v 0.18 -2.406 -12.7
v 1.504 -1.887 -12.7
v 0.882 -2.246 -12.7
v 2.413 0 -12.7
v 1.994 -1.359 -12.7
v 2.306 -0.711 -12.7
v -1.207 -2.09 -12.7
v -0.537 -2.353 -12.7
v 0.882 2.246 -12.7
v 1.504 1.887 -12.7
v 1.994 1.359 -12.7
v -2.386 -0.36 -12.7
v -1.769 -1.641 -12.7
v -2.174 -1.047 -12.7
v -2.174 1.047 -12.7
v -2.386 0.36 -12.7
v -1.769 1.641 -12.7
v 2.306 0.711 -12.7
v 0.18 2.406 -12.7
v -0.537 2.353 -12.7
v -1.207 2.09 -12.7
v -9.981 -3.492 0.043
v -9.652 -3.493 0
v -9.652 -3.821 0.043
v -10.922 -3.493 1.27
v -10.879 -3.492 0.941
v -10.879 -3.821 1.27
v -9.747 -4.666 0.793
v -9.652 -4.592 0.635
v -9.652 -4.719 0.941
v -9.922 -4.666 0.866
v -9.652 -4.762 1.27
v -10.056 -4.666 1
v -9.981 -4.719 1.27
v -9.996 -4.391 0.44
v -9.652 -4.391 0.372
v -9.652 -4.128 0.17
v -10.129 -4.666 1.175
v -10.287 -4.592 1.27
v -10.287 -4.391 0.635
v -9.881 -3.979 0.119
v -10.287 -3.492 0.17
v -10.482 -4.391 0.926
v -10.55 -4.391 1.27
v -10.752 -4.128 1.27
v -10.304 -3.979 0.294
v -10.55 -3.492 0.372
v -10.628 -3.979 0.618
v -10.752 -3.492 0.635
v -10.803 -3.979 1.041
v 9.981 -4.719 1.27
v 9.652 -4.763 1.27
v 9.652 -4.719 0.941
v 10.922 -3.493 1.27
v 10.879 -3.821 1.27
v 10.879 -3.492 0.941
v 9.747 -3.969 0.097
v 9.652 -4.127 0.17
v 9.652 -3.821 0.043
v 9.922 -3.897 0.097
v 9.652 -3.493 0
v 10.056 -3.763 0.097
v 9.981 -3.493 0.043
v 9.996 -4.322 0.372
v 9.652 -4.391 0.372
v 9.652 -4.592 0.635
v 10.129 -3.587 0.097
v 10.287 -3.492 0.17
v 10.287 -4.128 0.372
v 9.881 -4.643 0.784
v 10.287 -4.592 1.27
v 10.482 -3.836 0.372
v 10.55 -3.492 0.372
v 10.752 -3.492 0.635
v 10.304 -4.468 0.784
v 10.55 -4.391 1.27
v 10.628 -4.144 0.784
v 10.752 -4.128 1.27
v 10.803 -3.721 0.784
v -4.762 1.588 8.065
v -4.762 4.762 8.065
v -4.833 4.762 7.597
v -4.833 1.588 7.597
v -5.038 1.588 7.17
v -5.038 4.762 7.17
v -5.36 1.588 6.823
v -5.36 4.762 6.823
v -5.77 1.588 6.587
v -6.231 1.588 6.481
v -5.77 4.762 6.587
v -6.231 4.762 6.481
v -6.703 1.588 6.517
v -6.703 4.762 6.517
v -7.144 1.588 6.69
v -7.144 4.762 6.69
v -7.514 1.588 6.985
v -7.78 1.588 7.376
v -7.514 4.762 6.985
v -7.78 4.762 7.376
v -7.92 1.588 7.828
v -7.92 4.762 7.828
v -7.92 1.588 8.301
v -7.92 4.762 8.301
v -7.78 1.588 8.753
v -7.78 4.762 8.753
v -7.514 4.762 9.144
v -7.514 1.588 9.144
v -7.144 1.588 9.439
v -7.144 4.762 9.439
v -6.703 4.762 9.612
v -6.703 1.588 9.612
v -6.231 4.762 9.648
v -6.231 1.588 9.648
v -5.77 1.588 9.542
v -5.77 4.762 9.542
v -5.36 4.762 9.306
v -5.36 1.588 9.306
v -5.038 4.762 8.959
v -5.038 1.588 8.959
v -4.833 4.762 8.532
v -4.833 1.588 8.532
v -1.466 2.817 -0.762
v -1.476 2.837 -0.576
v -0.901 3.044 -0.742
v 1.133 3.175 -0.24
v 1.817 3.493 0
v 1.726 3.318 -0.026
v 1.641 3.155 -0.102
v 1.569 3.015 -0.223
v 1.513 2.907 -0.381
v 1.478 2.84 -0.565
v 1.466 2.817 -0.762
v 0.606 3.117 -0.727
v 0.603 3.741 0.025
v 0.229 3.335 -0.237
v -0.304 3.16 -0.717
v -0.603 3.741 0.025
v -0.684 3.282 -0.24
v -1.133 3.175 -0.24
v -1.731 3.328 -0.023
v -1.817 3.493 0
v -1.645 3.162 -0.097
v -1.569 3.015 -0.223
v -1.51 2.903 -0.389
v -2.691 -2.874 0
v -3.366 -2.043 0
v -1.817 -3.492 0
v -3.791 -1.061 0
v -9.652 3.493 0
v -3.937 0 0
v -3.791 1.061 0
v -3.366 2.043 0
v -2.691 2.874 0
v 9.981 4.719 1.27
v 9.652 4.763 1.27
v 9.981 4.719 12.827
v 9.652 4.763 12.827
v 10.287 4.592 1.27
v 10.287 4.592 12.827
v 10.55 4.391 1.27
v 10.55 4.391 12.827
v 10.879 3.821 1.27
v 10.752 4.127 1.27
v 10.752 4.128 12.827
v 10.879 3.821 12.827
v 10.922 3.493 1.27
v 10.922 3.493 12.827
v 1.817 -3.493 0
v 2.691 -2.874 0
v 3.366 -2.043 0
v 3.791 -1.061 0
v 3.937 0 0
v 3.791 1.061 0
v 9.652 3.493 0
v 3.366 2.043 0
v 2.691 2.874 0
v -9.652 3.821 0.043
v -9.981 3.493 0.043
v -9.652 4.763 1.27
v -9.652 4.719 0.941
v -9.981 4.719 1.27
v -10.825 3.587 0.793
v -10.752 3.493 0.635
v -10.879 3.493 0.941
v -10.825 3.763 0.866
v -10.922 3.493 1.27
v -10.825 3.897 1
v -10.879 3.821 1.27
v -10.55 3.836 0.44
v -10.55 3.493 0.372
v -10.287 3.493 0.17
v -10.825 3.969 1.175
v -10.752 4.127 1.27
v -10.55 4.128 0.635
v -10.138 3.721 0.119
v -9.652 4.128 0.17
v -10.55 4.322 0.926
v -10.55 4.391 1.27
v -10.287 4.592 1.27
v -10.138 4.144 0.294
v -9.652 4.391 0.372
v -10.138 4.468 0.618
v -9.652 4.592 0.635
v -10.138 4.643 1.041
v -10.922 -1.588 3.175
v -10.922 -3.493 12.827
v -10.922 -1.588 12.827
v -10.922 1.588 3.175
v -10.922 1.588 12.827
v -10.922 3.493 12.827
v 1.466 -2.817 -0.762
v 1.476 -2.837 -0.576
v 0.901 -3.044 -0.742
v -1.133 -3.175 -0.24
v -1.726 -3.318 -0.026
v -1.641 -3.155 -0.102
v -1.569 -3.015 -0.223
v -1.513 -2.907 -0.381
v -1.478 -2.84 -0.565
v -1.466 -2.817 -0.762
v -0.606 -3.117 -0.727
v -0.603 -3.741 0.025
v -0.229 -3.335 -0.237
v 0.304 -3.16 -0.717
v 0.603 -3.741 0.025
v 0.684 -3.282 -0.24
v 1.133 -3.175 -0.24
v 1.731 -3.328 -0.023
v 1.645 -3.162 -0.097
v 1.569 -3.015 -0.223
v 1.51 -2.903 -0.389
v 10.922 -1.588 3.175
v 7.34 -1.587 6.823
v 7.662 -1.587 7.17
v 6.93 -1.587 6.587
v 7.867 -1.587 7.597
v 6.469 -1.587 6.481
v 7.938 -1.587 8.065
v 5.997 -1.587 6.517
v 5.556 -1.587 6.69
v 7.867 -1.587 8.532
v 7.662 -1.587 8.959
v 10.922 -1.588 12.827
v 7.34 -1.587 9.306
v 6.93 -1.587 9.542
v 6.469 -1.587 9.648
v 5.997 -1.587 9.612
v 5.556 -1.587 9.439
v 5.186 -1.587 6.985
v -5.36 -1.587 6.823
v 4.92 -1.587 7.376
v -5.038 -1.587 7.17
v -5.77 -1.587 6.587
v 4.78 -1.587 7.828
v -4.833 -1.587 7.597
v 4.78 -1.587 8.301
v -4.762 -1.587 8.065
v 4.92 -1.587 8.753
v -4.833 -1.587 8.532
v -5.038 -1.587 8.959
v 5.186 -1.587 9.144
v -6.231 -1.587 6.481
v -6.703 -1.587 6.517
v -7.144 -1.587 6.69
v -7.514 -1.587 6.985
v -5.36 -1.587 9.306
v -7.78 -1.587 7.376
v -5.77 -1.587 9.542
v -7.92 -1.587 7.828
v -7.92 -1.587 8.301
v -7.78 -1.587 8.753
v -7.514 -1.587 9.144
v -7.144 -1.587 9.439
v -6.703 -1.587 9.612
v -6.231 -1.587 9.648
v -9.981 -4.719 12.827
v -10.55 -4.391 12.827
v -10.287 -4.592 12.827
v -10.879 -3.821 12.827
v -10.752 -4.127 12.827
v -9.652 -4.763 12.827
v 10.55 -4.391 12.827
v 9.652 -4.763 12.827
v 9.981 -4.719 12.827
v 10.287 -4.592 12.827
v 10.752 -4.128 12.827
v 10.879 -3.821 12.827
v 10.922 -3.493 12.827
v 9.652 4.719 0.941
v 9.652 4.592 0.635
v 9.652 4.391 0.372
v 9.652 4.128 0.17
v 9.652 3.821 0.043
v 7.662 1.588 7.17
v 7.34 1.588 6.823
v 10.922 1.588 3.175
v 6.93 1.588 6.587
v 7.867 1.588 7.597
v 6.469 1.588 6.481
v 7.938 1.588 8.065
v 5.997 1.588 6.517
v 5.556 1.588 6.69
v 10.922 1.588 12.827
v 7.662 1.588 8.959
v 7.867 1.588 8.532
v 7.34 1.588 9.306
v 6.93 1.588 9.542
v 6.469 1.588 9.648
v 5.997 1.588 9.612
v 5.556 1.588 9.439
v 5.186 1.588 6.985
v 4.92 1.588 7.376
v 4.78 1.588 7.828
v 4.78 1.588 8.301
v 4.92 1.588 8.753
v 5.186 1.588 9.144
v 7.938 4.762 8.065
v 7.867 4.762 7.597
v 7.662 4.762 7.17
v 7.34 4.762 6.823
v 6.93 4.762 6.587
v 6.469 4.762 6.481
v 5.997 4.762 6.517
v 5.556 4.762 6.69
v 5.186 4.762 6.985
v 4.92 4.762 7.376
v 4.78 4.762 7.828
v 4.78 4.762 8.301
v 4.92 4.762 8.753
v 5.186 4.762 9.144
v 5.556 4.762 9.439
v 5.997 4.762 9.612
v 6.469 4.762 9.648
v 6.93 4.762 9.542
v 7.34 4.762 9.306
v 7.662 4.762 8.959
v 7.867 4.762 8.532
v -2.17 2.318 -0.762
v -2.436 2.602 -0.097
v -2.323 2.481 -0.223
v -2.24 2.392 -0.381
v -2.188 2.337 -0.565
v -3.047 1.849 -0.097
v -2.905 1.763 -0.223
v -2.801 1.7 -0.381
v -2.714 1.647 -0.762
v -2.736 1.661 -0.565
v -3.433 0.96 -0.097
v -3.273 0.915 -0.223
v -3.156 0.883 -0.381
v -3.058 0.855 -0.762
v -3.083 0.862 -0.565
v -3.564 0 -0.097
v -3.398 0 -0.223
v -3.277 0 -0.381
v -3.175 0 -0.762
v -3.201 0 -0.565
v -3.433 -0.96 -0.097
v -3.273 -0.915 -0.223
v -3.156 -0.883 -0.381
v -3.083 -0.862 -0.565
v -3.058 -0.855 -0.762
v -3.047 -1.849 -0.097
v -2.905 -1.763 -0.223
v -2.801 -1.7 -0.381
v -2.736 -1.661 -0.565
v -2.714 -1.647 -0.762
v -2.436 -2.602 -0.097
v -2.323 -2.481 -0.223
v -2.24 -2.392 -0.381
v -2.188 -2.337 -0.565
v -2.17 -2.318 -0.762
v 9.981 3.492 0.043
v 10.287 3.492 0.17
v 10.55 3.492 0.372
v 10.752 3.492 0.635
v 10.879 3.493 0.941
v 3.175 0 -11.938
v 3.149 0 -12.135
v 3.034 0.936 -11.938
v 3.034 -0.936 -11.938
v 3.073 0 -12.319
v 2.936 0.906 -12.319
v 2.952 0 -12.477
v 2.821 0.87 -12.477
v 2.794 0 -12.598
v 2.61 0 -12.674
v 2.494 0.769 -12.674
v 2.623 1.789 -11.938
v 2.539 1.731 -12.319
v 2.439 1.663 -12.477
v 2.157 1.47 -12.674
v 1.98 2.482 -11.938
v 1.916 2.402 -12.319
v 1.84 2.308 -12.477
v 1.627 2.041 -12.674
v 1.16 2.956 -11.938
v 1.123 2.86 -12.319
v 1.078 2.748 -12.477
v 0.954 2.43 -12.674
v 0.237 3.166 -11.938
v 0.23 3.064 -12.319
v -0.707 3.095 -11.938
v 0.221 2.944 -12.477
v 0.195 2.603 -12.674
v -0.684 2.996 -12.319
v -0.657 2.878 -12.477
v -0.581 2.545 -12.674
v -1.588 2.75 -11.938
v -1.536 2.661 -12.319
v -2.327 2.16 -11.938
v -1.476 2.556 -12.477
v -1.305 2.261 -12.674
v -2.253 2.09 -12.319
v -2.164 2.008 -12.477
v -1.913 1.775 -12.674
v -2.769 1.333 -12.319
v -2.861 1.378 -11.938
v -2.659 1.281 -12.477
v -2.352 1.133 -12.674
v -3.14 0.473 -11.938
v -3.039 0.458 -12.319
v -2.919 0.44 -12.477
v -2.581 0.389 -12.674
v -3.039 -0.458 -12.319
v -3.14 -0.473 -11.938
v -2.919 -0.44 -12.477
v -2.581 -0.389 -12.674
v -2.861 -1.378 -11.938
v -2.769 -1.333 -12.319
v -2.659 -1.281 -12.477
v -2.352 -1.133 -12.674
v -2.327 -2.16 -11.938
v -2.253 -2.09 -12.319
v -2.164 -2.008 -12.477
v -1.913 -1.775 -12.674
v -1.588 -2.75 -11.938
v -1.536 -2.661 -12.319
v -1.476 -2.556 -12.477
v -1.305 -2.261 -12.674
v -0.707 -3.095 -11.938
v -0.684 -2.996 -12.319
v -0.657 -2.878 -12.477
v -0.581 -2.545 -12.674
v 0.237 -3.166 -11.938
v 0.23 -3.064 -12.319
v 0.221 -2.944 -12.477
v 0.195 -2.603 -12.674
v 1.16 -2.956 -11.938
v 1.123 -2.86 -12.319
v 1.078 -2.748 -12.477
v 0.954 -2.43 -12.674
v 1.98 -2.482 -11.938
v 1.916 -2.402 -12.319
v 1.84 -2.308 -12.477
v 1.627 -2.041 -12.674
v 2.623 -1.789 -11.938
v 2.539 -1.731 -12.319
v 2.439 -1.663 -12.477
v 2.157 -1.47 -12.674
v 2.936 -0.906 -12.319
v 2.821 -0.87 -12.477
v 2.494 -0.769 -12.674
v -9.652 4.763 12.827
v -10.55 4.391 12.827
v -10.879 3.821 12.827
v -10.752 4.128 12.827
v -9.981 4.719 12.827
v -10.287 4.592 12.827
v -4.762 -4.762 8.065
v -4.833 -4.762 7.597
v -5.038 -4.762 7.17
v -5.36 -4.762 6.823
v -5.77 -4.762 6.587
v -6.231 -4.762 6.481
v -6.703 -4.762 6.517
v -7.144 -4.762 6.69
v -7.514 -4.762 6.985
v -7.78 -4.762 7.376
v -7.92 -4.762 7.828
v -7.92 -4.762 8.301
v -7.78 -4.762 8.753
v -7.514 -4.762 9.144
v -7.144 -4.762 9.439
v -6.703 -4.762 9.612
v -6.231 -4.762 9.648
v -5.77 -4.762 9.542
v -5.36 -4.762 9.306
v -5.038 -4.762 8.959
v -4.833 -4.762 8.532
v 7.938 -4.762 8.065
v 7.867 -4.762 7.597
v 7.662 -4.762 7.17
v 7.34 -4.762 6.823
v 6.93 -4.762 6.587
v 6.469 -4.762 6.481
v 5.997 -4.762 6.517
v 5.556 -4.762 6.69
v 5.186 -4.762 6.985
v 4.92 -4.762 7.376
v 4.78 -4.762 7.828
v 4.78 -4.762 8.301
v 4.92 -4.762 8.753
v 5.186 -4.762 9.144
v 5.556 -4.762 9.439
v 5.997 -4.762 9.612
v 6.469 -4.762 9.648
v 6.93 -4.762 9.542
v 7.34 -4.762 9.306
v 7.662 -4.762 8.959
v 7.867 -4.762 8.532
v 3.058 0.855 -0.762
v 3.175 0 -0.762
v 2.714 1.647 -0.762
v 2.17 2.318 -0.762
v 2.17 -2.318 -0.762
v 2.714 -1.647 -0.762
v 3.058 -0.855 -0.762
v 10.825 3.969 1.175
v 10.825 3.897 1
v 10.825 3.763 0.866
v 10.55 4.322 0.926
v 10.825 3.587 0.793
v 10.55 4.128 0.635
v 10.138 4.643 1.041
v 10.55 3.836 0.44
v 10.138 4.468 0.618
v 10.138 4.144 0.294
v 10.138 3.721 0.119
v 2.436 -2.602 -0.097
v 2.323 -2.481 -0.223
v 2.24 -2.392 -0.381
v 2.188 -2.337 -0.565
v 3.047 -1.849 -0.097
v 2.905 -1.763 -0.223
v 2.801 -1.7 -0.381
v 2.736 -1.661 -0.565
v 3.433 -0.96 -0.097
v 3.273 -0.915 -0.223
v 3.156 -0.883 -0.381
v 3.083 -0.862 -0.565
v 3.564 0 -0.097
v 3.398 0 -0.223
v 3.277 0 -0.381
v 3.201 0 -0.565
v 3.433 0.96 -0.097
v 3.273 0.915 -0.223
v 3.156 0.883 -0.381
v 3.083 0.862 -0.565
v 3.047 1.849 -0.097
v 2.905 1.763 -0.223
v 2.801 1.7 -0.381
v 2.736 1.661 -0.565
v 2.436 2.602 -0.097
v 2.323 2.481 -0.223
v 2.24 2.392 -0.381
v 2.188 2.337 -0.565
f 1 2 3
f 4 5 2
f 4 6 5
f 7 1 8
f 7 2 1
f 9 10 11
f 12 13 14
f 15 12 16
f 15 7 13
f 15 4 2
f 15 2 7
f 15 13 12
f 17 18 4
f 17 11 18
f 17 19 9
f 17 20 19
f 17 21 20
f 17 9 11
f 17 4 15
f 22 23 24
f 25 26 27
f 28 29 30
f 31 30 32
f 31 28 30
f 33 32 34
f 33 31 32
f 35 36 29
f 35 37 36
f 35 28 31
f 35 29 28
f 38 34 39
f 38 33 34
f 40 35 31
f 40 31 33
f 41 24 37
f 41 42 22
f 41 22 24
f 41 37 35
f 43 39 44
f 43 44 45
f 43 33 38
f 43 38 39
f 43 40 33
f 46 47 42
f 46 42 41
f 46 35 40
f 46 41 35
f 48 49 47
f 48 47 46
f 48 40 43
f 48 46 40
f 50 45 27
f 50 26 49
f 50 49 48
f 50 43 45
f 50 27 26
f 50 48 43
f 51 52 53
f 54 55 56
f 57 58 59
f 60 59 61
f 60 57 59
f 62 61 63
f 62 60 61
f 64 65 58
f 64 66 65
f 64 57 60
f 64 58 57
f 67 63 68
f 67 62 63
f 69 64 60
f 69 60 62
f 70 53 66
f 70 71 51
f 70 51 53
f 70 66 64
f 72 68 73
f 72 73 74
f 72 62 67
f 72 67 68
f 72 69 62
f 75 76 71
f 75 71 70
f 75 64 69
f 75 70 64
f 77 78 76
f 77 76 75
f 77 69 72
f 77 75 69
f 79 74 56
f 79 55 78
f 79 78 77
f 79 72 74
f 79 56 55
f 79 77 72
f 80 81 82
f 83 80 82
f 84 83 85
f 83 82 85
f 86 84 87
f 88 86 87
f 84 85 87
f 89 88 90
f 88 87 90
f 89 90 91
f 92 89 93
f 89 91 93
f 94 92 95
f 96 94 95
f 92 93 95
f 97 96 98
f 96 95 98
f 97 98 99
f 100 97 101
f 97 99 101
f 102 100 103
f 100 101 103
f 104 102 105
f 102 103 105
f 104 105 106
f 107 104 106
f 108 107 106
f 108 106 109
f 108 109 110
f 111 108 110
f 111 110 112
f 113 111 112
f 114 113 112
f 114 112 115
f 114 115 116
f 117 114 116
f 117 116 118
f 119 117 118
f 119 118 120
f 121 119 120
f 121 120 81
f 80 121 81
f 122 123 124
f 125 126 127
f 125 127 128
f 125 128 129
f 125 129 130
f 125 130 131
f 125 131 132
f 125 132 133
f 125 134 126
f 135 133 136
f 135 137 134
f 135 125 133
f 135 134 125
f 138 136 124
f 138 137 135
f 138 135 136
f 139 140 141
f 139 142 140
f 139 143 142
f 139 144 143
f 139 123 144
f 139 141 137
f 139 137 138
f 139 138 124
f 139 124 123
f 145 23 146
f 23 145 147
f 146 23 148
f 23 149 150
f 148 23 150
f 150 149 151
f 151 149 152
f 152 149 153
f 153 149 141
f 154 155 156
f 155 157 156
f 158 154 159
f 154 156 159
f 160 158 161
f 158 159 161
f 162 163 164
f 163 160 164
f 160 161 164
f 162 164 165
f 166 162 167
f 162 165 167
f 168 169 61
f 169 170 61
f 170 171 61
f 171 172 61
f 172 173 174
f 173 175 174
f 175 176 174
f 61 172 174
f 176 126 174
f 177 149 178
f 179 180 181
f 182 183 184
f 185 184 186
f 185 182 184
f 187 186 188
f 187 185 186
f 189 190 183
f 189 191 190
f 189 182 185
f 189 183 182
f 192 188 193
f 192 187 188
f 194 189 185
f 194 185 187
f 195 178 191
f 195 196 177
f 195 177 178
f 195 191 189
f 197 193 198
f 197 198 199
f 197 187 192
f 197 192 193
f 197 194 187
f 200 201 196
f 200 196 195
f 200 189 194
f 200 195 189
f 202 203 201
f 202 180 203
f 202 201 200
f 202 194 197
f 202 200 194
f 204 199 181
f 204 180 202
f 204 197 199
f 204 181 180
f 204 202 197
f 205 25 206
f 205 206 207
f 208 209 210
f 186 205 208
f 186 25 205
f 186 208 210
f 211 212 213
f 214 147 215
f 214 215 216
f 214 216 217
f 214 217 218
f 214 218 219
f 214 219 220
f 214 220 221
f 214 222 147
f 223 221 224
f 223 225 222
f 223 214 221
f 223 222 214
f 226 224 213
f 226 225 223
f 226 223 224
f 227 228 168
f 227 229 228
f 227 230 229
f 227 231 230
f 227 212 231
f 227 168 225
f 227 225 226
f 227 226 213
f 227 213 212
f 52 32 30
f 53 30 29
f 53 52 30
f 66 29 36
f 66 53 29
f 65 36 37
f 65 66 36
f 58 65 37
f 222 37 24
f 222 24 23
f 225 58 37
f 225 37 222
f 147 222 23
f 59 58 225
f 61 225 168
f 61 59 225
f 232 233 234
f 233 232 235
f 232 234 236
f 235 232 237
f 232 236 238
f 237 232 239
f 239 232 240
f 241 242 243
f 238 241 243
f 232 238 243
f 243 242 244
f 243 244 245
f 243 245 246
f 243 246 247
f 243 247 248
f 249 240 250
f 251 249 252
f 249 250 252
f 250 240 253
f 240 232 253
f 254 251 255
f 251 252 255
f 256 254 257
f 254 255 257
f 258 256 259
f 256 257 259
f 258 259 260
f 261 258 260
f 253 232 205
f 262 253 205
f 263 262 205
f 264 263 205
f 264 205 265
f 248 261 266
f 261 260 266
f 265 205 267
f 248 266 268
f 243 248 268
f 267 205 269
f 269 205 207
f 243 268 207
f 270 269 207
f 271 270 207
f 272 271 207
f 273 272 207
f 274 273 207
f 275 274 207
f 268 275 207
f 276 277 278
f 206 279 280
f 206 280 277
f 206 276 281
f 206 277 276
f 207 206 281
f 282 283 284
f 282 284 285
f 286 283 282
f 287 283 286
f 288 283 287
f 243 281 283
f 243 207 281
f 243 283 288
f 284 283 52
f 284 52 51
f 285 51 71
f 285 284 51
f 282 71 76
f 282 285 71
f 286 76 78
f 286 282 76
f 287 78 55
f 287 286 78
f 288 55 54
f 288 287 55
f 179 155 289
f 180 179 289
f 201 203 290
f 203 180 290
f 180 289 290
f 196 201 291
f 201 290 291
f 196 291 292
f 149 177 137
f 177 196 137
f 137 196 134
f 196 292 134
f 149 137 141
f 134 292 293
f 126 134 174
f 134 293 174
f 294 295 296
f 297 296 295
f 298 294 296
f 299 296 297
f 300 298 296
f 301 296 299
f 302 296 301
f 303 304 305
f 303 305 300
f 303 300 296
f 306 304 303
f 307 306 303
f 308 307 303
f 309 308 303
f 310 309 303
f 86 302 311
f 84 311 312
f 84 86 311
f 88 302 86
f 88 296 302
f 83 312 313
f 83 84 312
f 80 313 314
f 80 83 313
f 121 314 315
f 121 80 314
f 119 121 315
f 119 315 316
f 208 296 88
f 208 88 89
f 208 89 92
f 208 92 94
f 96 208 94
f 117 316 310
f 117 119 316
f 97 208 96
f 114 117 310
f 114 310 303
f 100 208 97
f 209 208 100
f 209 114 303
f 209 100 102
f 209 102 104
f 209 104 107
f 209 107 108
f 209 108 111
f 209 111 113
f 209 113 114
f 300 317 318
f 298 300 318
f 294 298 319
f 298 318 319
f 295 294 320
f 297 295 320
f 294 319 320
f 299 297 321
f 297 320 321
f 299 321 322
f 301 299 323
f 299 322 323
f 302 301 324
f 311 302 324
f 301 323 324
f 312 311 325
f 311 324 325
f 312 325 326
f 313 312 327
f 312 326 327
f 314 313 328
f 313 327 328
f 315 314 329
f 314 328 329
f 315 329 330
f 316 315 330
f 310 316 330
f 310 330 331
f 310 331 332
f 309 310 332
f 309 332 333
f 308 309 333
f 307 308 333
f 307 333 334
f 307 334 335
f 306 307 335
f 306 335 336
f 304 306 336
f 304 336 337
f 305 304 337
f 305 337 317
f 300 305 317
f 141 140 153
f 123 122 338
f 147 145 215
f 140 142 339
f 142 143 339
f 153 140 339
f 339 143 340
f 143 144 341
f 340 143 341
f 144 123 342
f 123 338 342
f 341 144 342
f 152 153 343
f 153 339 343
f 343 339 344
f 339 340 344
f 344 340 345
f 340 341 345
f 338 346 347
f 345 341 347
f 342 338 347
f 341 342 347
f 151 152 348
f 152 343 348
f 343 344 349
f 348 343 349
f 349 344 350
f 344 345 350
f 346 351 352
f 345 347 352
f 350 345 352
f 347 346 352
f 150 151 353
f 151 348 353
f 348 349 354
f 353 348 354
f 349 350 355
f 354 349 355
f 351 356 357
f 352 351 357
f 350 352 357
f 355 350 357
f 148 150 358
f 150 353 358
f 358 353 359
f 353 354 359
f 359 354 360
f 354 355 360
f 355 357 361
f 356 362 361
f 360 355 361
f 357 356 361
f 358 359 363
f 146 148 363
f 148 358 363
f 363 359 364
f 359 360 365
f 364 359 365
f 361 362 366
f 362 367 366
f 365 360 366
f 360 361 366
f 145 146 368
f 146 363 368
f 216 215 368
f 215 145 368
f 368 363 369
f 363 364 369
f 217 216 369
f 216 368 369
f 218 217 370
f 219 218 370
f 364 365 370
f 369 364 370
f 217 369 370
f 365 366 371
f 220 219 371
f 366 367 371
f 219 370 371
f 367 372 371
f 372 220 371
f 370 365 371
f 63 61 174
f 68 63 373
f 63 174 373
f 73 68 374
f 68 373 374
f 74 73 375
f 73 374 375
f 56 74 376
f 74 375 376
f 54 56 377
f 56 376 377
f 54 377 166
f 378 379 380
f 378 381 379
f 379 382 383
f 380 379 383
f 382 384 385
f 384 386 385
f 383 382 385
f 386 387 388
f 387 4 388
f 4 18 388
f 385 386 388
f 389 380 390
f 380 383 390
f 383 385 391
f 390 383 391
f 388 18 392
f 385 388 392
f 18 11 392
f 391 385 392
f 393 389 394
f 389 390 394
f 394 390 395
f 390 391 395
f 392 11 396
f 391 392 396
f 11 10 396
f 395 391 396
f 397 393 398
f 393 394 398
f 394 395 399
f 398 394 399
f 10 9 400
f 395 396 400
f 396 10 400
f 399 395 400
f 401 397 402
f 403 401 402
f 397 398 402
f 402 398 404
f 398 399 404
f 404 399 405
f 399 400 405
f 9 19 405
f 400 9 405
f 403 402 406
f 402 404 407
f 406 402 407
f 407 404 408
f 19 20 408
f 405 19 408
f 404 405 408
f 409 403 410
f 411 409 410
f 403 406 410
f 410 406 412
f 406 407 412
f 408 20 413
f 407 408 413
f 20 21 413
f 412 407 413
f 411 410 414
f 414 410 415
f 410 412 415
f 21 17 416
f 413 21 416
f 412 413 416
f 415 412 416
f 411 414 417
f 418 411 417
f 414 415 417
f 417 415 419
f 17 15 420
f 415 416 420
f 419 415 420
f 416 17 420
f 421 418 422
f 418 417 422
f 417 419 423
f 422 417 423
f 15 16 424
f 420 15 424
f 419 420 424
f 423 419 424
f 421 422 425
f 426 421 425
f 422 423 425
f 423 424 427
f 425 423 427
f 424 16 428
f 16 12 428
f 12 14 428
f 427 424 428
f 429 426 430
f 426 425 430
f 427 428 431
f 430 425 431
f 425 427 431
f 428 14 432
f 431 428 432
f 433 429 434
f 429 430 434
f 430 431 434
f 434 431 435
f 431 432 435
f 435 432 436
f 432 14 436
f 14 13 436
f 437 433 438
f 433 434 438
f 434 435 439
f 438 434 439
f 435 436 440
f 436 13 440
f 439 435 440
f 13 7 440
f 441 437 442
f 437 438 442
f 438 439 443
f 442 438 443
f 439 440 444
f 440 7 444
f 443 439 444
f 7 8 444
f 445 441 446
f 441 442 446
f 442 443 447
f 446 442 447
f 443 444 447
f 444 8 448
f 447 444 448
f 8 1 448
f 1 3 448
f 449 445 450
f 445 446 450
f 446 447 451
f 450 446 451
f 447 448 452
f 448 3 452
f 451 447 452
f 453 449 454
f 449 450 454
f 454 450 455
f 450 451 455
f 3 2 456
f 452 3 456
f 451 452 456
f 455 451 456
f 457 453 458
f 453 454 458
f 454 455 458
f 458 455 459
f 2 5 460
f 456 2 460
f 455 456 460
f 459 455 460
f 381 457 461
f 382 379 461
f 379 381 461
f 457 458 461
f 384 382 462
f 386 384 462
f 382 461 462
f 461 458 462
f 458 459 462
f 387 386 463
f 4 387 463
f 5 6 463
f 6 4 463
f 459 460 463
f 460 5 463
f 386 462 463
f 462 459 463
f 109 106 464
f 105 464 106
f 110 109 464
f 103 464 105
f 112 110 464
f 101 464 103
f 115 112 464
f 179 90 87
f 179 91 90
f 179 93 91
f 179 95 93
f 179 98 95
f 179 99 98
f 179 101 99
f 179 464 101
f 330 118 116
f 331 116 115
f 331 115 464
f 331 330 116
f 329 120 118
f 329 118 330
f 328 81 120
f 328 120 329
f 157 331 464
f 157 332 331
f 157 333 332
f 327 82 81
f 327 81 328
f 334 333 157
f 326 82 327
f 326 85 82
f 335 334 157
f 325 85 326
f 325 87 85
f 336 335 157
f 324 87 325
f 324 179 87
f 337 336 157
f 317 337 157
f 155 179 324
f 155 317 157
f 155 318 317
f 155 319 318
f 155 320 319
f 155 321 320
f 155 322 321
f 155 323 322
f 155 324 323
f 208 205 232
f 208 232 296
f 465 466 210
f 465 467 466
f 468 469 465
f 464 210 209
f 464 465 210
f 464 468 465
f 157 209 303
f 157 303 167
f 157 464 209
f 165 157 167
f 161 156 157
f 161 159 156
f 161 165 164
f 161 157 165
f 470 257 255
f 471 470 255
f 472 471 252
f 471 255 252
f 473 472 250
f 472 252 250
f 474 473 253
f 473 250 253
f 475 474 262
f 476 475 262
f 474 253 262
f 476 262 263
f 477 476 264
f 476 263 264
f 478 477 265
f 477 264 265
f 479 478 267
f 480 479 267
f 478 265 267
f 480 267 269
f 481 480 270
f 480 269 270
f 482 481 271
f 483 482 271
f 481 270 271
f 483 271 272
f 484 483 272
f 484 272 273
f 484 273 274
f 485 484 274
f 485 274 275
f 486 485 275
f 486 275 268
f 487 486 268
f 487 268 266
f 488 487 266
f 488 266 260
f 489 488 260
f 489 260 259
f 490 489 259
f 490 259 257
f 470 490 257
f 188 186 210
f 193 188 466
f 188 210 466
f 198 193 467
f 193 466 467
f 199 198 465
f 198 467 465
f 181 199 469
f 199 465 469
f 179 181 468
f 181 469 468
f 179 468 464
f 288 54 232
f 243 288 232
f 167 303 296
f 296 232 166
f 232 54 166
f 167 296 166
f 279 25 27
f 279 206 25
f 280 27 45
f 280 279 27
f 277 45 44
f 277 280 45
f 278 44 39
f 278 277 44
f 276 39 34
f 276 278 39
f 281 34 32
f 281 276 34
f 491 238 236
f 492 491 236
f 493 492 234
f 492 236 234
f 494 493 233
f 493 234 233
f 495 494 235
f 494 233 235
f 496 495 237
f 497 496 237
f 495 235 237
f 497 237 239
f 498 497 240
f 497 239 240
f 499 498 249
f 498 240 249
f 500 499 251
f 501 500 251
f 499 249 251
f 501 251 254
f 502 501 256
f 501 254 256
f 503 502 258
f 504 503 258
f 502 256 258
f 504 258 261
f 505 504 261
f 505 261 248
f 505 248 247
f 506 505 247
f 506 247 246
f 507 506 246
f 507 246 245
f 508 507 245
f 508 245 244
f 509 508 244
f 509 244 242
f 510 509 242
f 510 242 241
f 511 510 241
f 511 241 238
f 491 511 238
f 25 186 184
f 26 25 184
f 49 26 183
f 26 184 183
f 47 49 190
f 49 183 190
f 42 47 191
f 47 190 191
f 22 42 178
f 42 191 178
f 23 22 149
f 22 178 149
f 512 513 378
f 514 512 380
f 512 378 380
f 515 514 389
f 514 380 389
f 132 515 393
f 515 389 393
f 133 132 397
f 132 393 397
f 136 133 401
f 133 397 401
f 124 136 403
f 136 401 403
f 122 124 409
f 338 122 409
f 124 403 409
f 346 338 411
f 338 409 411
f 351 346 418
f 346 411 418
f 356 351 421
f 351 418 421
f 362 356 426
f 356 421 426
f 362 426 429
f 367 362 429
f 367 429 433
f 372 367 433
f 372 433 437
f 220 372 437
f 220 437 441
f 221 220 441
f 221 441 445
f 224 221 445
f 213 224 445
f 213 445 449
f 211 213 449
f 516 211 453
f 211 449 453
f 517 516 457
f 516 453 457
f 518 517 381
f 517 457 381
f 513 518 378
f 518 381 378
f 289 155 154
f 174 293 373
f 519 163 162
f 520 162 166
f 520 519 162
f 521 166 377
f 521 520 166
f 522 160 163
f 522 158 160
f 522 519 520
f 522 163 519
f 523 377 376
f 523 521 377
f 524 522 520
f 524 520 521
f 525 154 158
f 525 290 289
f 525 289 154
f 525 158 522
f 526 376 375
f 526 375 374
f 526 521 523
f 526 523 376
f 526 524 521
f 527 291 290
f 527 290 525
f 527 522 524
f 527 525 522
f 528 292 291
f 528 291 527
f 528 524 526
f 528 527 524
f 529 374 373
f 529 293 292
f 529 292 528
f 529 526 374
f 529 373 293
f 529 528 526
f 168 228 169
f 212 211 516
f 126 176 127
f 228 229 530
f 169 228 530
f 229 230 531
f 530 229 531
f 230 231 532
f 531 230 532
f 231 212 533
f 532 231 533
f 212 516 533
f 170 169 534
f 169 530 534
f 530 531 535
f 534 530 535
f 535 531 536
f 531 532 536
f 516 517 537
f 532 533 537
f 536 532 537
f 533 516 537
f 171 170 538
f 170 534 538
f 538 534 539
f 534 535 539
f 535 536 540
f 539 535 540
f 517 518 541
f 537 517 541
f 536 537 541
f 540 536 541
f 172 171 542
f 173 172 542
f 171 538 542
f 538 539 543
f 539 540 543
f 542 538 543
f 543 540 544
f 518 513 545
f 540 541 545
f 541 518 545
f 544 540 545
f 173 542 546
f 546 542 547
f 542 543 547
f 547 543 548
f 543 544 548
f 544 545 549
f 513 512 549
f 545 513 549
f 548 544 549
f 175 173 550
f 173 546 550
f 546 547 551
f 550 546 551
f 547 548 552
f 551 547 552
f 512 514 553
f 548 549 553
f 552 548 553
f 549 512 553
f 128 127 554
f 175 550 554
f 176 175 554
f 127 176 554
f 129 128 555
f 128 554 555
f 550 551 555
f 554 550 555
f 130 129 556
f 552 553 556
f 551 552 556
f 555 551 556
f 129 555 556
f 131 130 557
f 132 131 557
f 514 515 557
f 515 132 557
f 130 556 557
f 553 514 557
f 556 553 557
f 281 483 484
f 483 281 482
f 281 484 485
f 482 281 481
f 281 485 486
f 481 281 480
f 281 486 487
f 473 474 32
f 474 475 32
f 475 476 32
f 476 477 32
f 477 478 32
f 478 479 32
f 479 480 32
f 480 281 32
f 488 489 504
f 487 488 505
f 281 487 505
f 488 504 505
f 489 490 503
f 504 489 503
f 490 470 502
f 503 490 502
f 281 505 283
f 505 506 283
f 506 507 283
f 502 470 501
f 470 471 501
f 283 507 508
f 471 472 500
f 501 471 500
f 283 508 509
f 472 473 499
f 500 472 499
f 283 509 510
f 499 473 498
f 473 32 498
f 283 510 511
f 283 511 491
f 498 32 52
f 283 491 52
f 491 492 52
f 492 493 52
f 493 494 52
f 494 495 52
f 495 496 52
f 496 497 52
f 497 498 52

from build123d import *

# Parameters (mm, degrees)
SKETCH1_W           = 3.175
SKETCH1_H           = 12.7
SKETCH2_W           = 21.844
SKETCH2_H           = 9.525
BOSS_EXTRUDE1_DEPTH = 12.827
FILLET4_R           = 1.27
SKETCH3_W           = 9.652
SKETCH3_H           = 3.175
CUT_EXTRUDE1_DEPTH  = 22.844
SKETCH4_R           = 1.5875
CUT_EXTRUDE2_DEPTH  = 10.525
FILLET5_R           = 0.762


with BuildPart() as part:
    # Sketch1 → Revolve1 (revolve)
    with BuildSketch(Plane(origin=(0, 0, 0), x_dir=(1, 0, 0), z_dir=(0, 1, 0))):
        with Locations((1.5875, 6.35)):
            Rectangle(SKETCH1_W, SKETCH1_H)
    revolve(axis=Axis((0, 0, -12.7), (0, 0, 1)))

    # Sketch2 → Boss-Extrude1 (add)
    with BuildSketch(Plane.XY):
        Rectangle(SKETCH2_W, SKETCH2_H)
    extrude(amount=BOSS_EXTRUDE1_DEPTH)

    # Fillet4
    fillet4_edges = [part.edges().sort_by_distance(p)[0] for p in [
        (10.922, -4.7625, 6.4135),
        (0, 4.7625, 0),
        (10.922, 4.7625, 6.4135),
        (-10.922, 0, 0),
        (-10.922, 4.7625, 6.4135),
        (0, -4.7625, 0),
        (-10.922, -4.7625, 6.4135),
        (10.922, 0, 0),
    ]]
    fillet(fillet4_edges, radius=FILLET4_R)

    # Sketch3 → Cut-Extrude1 (cut, through all)
    with BuildSketch(Plane.ZY.offset(10.922)):
        with Locations((8.001, 0)):
            Rectangle(SKETCH3_W, SKETCH3_H)
    extrude(amount=-CUT_EXTRUDE1_DEPTH, mode=Mode.SUBTRACT)

    # Sketch4 → Cut-Extrude2 (cut, through all)
    with BuildSketch(Plane(origin=(0, 4.7625, 0), x_dir=(1, 0, 0), z_dir=(0, 1, 0))):
        with Locations((-6.35, -8.0645)):
            Circle(SKETCH4_R)
        with Locations((6.35, -8.0645)):
            Circle(SKETCH4_R)
    extrude(amount=-CUT_EXTRUDE2_DEPTH, mode=Mode.SUBTRACT)

    # Fillet5
    fillet5_edges = [part.edges().sort_by_distance(p)[0] for p in [
        (-3.175, 0, 0),
        (-3.175, 0, -12.7),
    ]]
    fillet(fillet5_edges, radius=FILLET5_R)


solid = part.part
